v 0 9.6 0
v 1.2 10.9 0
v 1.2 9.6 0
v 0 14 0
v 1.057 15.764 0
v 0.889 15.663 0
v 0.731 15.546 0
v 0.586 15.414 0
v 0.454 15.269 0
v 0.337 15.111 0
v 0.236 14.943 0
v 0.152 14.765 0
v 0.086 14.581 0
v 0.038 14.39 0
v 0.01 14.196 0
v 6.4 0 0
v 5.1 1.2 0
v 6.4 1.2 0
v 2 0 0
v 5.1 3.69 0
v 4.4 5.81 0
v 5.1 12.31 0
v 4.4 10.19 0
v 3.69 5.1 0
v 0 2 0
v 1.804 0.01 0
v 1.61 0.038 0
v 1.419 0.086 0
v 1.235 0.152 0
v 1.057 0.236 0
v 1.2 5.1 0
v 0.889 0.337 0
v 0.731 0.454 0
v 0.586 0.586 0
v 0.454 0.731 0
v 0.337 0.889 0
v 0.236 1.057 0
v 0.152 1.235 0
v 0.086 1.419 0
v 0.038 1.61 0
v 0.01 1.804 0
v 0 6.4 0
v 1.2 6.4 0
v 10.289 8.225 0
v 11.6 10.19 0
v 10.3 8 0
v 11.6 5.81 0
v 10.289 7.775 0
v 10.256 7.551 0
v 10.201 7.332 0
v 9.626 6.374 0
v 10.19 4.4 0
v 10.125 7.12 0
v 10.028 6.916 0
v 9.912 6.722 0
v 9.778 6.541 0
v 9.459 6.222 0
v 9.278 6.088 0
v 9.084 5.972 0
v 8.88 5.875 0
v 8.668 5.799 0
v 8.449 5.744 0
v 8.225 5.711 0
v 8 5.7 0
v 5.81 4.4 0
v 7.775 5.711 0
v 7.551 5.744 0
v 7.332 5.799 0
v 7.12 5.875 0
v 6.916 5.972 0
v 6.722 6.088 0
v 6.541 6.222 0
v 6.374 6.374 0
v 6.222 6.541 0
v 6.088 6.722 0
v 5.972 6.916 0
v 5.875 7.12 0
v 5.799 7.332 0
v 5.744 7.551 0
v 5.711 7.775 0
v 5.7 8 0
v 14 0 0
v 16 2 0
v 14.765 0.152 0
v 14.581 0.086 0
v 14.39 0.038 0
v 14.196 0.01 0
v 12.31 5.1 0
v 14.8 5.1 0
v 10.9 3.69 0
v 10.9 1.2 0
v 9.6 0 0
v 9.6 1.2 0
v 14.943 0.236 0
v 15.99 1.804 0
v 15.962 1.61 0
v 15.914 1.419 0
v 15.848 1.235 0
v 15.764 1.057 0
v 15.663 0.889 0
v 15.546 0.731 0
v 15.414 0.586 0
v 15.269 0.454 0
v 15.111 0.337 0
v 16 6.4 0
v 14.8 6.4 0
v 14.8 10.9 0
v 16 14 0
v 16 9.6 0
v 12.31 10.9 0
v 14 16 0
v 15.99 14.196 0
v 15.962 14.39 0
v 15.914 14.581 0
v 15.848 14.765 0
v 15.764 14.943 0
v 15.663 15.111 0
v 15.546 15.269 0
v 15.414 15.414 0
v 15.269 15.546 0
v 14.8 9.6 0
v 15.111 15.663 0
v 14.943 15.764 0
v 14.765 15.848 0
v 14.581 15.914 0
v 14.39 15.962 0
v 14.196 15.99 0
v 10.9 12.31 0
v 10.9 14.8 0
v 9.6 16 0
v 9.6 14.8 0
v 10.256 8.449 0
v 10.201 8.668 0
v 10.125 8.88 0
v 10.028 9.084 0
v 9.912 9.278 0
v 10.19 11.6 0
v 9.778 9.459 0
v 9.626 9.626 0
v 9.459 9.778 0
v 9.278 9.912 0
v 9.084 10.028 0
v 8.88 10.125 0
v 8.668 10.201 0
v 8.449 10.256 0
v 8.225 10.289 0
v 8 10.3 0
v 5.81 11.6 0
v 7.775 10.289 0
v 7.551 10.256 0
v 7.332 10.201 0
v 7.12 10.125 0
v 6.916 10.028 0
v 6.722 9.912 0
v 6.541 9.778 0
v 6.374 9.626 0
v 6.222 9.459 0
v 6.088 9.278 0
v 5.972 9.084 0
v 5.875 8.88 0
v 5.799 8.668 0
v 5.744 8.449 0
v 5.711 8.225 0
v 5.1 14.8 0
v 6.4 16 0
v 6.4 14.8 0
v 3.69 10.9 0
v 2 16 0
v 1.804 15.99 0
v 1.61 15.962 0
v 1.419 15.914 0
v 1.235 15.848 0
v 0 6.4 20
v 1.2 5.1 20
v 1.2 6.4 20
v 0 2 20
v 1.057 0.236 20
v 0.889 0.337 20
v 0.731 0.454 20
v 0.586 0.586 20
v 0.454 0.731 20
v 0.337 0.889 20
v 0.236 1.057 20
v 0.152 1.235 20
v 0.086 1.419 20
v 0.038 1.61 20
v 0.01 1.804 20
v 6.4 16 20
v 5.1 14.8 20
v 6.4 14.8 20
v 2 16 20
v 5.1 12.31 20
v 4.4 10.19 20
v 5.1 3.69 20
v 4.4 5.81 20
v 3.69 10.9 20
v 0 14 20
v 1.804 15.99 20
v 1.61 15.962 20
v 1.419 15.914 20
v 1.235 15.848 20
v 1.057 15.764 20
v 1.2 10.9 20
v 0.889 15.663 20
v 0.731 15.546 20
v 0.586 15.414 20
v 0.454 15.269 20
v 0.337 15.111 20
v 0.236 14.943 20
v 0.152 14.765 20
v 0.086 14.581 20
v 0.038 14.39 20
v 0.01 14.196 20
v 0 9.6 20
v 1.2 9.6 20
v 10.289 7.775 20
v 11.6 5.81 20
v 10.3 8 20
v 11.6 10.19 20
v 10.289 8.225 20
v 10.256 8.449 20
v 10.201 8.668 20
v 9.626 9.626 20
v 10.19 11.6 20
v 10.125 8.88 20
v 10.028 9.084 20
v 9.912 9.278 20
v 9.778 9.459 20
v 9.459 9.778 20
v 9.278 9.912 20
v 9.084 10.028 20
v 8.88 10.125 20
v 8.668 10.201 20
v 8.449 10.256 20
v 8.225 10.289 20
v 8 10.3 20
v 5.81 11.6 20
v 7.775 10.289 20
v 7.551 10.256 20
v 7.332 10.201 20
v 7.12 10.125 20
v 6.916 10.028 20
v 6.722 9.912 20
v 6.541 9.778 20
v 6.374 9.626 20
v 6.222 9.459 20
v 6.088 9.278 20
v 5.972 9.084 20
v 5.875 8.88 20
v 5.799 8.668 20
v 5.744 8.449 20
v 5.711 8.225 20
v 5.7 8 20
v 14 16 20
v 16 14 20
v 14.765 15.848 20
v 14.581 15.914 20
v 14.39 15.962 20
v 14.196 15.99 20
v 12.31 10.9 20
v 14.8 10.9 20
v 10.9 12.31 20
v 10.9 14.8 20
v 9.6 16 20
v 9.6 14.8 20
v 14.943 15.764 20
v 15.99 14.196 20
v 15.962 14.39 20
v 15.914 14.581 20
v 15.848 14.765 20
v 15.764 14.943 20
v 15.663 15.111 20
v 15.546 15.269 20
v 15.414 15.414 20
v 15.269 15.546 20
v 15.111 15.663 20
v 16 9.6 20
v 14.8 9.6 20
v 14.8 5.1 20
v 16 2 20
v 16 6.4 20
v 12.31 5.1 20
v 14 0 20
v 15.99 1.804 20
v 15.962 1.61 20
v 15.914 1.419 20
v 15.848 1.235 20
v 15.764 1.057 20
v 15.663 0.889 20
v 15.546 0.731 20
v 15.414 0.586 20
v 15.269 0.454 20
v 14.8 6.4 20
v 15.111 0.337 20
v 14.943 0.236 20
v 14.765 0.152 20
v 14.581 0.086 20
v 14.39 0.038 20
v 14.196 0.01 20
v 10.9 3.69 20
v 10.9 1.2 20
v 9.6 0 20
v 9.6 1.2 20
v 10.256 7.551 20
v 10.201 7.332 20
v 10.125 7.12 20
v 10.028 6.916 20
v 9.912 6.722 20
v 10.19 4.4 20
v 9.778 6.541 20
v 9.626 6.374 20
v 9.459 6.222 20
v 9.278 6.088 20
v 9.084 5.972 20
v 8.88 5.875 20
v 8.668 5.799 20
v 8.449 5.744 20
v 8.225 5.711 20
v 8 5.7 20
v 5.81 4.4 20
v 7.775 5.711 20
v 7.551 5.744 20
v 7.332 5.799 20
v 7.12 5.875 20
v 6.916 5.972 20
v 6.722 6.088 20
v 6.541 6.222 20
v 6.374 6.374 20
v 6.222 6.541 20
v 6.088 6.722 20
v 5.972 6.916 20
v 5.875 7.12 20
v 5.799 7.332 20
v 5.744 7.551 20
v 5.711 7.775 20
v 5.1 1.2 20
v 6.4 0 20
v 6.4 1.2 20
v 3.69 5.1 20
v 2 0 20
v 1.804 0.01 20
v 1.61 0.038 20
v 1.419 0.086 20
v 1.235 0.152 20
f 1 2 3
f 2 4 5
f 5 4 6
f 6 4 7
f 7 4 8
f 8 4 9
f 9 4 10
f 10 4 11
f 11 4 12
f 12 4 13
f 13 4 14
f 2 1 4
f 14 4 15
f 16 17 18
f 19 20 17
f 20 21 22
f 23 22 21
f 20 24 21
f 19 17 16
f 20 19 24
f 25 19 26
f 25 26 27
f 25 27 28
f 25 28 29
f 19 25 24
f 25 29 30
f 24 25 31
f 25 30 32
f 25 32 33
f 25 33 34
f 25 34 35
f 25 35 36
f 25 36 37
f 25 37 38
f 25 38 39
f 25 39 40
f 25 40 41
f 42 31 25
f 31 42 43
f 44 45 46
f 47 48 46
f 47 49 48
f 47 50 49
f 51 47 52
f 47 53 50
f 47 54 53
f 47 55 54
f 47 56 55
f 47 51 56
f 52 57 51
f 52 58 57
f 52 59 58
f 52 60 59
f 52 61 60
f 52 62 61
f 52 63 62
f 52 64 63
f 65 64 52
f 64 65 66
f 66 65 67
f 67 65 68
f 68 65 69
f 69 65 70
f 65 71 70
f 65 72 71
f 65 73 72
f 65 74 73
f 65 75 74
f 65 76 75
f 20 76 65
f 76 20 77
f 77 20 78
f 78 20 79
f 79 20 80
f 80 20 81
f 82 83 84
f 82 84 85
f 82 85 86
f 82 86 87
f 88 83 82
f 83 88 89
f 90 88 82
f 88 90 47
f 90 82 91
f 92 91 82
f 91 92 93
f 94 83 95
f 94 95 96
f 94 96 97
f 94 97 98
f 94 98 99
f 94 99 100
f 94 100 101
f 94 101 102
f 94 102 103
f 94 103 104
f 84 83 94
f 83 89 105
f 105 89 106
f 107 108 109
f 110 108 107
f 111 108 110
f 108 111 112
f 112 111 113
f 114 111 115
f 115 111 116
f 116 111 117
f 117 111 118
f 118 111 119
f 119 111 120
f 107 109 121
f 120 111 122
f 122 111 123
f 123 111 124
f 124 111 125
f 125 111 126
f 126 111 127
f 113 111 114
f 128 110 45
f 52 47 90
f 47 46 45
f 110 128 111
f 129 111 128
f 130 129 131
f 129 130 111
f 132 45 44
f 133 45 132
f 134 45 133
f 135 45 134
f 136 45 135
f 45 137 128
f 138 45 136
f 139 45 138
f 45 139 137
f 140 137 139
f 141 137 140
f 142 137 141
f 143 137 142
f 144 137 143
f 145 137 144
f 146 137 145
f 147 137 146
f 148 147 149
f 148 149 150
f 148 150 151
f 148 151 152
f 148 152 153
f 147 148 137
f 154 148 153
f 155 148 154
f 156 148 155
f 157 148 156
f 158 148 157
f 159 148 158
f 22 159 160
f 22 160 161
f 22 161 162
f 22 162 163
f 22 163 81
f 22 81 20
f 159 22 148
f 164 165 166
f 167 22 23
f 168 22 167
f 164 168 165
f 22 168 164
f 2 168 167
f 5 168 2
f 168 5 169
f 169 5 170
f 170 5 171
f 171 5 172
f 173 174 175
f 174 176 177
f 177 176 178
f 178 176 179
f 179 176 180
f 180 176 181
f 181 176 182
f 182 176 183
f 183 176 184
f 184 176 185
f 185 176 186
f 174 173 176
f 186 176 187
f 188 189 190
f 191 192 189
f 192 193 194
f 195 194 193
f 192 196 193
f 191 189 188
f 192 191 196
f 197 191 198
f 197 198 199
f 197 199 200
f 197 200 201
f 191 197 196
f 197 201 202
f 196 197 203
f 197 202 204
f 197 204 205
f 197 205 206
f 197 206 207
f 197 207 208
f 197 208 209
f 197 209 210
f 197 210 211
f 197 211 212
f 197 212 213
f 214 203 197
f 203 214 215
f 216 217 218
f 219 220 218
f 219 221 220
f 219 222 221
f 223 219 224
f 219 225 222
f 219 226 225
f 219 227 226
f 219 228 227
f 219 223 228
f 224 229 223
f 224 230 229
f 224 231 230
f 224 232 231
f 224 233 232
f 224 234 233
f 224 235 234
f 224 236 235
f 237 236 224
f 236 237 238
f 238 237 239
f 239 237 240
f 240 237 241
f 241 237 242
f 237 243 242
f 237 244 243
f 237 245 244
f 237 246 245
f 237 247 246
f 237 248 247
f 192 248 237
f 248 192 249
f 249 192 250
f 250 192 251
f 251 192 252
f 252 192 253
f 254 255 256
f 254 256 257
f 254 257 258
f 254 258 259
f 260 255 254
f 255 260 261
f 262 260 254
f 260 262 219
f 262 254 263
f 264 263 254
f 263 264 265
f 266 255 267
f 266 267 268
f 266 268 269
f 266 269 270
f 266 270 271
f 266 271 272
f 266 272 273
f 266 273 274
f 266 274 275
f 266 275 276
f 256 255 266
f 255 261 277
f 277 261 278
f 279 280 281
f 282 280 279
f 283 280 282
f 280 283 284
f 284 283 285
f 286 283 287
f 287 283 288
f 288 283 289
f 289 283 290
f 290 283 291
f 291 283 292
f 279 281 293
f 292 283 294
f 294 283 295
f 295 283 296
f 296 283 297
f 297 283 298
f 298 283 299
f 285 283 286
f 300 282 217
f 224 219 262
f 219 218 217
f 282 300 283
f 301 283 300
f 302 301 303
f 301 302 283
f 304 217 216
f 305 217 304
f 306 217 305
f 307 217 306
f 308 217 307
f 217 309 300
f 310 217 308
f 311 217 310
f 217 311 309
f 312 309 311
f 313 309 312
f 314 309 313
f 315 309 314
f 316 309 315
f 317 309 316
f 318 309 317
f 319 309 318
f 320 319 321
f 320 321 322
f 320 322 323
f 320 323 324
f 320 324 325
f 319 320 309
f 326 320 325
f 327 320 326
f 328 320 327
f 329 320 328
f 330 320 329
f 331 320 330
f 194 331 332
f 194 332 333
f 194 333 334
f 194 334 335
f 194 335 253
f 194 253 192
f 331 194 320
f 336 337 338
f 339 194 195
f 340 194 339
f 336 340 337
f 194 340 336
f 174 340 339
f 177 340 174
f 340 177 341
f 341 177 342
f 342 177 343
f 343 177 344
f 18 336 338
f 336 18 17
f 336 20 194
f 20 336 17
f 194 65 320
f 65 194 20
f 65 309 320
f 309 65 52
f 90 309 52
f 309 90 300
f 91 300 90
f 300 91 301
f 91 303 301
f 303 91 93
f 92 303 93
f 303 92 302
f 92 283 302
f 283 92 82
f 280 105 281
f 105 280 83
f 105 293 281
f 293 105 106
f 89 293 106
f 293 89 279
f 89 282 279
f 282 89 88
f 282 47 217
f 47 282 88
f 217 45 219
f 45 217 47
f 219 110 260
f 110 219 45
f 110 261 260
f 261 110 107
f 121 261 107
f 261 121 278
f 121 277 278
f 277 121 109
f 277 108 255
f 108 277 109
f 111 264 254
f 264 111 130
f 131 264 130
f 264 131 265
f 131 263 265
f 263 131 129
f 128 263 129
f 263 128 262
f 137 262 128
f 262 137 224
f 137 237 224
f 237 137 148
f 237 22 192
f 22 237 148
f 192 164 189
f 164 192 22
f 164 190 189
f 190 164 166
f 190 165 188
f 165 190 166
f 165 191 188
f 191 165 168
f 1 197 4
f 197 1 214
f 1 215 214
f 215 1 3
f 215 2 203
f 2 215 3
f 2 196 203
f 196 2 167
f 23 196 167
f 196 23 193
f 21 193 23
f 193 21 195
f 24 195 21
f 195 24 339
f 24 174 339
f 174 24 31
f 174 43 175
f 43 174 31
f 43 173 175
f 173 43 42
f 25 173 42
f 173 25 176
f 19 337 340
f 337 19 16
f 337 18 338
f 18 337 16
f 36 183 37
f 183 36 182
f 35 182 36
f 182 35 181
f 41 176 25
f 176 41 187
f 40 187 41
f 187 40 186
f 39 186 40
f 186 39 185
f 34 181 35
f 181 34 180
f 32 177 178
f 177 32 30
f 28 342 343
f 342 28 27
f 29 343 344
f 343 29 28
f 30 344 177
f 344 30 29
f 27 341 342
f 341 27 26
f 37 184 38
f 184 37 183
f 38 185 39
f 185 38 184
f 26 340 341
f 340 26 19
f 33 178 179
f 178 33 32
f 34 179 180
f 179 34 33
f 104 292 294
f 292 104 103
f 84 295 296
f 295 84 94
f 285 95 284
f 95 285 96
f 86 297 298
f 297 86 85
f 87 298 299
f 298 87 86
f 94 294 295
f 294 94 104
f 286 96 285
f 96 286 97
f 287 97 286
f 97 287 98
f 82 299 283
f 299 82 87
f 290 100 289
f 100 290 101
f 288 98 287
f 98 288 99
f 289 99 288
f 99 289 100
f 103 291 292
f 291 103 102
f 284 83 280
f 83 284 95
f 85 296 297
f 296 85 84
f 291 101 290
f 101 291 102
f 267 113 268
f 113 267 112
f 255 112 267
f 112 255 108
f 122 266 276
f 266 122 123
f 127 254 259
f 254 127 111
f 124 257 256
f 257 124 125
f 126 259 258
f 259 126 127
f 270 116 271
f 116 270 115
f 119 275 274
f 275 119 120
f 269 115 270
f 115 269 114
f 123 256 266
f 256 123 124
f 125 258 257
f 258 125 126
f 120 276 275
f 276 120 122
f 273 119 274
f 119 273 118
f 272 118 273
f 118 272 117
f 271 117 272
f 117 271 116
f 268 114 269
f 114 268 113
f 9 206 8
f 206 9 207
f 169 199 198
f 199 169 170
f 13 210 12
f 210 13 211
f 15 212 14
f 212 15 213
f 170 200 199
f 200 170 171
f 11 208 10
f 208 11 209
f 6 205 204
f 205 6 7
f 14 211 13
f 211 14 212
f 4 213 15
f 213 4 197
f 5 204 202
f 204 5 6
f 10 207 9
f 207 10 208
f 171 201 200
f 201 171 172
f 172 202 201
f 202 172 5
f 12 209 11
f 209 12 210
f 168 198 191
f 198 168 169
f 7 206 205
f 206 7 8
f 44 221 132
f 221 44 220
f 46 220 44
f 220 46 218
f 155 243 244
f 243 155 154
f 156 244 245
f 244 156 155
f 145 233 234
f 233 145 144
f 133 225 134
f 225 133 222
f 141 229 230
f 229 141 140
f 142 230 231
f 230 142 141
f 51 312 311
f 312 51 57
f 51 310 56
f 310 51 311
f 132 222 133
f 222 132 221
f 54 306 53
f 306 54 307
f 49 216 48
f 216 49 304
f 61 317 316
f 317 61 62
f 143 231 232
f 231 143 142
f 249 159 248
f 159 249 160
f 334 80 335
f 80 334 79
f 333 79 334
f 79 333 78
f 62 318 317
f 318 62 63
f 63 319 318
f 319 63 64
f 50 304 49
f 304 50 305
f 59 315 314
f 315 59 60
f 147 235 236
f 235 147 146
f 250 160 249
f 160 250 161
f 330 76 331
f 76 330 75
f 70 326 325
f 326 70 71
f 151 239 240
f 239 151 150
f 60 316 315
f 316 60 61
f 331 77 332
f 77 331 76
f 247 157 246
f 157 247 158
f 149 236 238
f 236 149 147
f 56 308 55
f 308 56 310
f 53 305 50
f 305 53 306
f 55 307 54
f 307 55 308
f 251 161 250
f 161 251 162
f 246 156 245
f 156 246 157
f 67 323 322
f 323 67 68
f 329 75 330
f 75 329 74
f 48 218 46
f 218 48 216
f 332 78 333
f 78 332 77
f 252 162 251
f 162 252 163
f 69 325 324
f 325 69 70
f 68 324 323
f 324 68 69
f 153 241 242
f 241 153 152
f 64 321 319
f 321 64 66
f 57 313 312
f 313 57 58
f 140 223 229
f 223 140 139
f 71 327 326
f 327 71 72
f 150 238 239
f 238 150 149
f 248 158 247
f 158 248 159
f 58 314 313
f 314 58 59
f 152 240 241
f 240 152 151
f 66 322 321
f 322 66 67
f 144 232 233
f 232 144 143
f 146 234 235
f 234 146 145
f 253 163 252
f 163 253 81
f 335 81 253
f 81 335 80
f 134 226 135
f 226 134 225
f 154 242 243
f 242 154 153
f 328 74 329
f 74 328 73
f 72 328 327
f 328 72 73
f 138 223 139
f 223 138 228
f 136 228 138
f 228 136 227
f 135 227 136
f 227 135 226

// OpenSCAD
/**
 * Standard PLA Frame 16mm x 16mm
 * Model No. SPF1616
 *
 * Designed by Kirimaru
 *
 * The slit on the side can be used to insert an M3 nuts.
 * For correct printing, it is recommended to reduce the
 * print speed.
 *
 * This code is licensed under CC0.
 * https://creativecommons.org/publicdomain/zero/1.0/deed.en
 */

// total length
Length = 20;

// hole diameter, defined for M3 insert nut
HoleDia = 4.6;

points = [
    [ 2.00,  0.00],
    [ 6.40,  0.00],
    [ 6.40,  1.20],
    [ 5.10,  1.20],
    [ 5.10,  3.69],
    [ 5.81,  4.40],
    [10.19,  4.40],
    [10.90,  3.69],
    [10.90,  1.20],
    [ 9.60,  1.20],
    [ 9.60,  0.00],
    [14.00,  0.00],

    [16.00,  2.00],
    [16.00,  6.40],
    [14.80,  6.40],
    [14.80,  5.10],
    [12.31,  5.10],
    [11.60,  5.81],
    [11.60, 10.19],
    [12.31, 10.90],
    [14.80, 10.90],
    [14.80,  9.60],
    [16.00,  9.60],
    [16.00, 14.00],

    [14.00, 16.00],
    [ 9.60, 16.00],
    [ 9.60, 14.80],
    [10.90, 14.80],
    [10.90, 12.31],
    [10.19, 11.60],
    [ 5.81, 11.60],
    [ 5.10, 12.31],
    [ 5.10, 14.80],
    [ 6.40, 14.80],
    [ 6.40, 16.00],
    [ 2.00, 16.00],

    [ 0.00, 14.00],
    [ 0.00,  9.60],
    [ 1.20,  9.60],
    [ 1.20, 10.90],
    [ 3.69, 10.90],
    [ 4.40, 10.19],
    [ 4.40,  5.81],
    [ 3.69,  5.10],
    [ 1.20,  5.10],
    [ 1.20,  6.40],
    [ 0.00,  6.40],
    [ 0.00,  2.00]
];

difference(){
    union(){
        render(convexity=10)
            linear_extrude(Length)
                polygon(points);

        translate([2,2,0])
            linear_extrude(Length)
                circle(r=2, $fn=64);

        translate([14,2,0])
            linear_extrude(Length)
                circle(r=2, $fn=64);

        translate([14,14,0])
            linear_extrude(Length)
                circle(r=2, $fn=64);

        translate([2,14,0])
            linear_extrude(Length)
                circle(r=2, $fn=64);
    }

    translate([8,8,-2])
        linear_extrude(Length+4)
            circle(r=HoleDia/2 , $fn=64);
}
